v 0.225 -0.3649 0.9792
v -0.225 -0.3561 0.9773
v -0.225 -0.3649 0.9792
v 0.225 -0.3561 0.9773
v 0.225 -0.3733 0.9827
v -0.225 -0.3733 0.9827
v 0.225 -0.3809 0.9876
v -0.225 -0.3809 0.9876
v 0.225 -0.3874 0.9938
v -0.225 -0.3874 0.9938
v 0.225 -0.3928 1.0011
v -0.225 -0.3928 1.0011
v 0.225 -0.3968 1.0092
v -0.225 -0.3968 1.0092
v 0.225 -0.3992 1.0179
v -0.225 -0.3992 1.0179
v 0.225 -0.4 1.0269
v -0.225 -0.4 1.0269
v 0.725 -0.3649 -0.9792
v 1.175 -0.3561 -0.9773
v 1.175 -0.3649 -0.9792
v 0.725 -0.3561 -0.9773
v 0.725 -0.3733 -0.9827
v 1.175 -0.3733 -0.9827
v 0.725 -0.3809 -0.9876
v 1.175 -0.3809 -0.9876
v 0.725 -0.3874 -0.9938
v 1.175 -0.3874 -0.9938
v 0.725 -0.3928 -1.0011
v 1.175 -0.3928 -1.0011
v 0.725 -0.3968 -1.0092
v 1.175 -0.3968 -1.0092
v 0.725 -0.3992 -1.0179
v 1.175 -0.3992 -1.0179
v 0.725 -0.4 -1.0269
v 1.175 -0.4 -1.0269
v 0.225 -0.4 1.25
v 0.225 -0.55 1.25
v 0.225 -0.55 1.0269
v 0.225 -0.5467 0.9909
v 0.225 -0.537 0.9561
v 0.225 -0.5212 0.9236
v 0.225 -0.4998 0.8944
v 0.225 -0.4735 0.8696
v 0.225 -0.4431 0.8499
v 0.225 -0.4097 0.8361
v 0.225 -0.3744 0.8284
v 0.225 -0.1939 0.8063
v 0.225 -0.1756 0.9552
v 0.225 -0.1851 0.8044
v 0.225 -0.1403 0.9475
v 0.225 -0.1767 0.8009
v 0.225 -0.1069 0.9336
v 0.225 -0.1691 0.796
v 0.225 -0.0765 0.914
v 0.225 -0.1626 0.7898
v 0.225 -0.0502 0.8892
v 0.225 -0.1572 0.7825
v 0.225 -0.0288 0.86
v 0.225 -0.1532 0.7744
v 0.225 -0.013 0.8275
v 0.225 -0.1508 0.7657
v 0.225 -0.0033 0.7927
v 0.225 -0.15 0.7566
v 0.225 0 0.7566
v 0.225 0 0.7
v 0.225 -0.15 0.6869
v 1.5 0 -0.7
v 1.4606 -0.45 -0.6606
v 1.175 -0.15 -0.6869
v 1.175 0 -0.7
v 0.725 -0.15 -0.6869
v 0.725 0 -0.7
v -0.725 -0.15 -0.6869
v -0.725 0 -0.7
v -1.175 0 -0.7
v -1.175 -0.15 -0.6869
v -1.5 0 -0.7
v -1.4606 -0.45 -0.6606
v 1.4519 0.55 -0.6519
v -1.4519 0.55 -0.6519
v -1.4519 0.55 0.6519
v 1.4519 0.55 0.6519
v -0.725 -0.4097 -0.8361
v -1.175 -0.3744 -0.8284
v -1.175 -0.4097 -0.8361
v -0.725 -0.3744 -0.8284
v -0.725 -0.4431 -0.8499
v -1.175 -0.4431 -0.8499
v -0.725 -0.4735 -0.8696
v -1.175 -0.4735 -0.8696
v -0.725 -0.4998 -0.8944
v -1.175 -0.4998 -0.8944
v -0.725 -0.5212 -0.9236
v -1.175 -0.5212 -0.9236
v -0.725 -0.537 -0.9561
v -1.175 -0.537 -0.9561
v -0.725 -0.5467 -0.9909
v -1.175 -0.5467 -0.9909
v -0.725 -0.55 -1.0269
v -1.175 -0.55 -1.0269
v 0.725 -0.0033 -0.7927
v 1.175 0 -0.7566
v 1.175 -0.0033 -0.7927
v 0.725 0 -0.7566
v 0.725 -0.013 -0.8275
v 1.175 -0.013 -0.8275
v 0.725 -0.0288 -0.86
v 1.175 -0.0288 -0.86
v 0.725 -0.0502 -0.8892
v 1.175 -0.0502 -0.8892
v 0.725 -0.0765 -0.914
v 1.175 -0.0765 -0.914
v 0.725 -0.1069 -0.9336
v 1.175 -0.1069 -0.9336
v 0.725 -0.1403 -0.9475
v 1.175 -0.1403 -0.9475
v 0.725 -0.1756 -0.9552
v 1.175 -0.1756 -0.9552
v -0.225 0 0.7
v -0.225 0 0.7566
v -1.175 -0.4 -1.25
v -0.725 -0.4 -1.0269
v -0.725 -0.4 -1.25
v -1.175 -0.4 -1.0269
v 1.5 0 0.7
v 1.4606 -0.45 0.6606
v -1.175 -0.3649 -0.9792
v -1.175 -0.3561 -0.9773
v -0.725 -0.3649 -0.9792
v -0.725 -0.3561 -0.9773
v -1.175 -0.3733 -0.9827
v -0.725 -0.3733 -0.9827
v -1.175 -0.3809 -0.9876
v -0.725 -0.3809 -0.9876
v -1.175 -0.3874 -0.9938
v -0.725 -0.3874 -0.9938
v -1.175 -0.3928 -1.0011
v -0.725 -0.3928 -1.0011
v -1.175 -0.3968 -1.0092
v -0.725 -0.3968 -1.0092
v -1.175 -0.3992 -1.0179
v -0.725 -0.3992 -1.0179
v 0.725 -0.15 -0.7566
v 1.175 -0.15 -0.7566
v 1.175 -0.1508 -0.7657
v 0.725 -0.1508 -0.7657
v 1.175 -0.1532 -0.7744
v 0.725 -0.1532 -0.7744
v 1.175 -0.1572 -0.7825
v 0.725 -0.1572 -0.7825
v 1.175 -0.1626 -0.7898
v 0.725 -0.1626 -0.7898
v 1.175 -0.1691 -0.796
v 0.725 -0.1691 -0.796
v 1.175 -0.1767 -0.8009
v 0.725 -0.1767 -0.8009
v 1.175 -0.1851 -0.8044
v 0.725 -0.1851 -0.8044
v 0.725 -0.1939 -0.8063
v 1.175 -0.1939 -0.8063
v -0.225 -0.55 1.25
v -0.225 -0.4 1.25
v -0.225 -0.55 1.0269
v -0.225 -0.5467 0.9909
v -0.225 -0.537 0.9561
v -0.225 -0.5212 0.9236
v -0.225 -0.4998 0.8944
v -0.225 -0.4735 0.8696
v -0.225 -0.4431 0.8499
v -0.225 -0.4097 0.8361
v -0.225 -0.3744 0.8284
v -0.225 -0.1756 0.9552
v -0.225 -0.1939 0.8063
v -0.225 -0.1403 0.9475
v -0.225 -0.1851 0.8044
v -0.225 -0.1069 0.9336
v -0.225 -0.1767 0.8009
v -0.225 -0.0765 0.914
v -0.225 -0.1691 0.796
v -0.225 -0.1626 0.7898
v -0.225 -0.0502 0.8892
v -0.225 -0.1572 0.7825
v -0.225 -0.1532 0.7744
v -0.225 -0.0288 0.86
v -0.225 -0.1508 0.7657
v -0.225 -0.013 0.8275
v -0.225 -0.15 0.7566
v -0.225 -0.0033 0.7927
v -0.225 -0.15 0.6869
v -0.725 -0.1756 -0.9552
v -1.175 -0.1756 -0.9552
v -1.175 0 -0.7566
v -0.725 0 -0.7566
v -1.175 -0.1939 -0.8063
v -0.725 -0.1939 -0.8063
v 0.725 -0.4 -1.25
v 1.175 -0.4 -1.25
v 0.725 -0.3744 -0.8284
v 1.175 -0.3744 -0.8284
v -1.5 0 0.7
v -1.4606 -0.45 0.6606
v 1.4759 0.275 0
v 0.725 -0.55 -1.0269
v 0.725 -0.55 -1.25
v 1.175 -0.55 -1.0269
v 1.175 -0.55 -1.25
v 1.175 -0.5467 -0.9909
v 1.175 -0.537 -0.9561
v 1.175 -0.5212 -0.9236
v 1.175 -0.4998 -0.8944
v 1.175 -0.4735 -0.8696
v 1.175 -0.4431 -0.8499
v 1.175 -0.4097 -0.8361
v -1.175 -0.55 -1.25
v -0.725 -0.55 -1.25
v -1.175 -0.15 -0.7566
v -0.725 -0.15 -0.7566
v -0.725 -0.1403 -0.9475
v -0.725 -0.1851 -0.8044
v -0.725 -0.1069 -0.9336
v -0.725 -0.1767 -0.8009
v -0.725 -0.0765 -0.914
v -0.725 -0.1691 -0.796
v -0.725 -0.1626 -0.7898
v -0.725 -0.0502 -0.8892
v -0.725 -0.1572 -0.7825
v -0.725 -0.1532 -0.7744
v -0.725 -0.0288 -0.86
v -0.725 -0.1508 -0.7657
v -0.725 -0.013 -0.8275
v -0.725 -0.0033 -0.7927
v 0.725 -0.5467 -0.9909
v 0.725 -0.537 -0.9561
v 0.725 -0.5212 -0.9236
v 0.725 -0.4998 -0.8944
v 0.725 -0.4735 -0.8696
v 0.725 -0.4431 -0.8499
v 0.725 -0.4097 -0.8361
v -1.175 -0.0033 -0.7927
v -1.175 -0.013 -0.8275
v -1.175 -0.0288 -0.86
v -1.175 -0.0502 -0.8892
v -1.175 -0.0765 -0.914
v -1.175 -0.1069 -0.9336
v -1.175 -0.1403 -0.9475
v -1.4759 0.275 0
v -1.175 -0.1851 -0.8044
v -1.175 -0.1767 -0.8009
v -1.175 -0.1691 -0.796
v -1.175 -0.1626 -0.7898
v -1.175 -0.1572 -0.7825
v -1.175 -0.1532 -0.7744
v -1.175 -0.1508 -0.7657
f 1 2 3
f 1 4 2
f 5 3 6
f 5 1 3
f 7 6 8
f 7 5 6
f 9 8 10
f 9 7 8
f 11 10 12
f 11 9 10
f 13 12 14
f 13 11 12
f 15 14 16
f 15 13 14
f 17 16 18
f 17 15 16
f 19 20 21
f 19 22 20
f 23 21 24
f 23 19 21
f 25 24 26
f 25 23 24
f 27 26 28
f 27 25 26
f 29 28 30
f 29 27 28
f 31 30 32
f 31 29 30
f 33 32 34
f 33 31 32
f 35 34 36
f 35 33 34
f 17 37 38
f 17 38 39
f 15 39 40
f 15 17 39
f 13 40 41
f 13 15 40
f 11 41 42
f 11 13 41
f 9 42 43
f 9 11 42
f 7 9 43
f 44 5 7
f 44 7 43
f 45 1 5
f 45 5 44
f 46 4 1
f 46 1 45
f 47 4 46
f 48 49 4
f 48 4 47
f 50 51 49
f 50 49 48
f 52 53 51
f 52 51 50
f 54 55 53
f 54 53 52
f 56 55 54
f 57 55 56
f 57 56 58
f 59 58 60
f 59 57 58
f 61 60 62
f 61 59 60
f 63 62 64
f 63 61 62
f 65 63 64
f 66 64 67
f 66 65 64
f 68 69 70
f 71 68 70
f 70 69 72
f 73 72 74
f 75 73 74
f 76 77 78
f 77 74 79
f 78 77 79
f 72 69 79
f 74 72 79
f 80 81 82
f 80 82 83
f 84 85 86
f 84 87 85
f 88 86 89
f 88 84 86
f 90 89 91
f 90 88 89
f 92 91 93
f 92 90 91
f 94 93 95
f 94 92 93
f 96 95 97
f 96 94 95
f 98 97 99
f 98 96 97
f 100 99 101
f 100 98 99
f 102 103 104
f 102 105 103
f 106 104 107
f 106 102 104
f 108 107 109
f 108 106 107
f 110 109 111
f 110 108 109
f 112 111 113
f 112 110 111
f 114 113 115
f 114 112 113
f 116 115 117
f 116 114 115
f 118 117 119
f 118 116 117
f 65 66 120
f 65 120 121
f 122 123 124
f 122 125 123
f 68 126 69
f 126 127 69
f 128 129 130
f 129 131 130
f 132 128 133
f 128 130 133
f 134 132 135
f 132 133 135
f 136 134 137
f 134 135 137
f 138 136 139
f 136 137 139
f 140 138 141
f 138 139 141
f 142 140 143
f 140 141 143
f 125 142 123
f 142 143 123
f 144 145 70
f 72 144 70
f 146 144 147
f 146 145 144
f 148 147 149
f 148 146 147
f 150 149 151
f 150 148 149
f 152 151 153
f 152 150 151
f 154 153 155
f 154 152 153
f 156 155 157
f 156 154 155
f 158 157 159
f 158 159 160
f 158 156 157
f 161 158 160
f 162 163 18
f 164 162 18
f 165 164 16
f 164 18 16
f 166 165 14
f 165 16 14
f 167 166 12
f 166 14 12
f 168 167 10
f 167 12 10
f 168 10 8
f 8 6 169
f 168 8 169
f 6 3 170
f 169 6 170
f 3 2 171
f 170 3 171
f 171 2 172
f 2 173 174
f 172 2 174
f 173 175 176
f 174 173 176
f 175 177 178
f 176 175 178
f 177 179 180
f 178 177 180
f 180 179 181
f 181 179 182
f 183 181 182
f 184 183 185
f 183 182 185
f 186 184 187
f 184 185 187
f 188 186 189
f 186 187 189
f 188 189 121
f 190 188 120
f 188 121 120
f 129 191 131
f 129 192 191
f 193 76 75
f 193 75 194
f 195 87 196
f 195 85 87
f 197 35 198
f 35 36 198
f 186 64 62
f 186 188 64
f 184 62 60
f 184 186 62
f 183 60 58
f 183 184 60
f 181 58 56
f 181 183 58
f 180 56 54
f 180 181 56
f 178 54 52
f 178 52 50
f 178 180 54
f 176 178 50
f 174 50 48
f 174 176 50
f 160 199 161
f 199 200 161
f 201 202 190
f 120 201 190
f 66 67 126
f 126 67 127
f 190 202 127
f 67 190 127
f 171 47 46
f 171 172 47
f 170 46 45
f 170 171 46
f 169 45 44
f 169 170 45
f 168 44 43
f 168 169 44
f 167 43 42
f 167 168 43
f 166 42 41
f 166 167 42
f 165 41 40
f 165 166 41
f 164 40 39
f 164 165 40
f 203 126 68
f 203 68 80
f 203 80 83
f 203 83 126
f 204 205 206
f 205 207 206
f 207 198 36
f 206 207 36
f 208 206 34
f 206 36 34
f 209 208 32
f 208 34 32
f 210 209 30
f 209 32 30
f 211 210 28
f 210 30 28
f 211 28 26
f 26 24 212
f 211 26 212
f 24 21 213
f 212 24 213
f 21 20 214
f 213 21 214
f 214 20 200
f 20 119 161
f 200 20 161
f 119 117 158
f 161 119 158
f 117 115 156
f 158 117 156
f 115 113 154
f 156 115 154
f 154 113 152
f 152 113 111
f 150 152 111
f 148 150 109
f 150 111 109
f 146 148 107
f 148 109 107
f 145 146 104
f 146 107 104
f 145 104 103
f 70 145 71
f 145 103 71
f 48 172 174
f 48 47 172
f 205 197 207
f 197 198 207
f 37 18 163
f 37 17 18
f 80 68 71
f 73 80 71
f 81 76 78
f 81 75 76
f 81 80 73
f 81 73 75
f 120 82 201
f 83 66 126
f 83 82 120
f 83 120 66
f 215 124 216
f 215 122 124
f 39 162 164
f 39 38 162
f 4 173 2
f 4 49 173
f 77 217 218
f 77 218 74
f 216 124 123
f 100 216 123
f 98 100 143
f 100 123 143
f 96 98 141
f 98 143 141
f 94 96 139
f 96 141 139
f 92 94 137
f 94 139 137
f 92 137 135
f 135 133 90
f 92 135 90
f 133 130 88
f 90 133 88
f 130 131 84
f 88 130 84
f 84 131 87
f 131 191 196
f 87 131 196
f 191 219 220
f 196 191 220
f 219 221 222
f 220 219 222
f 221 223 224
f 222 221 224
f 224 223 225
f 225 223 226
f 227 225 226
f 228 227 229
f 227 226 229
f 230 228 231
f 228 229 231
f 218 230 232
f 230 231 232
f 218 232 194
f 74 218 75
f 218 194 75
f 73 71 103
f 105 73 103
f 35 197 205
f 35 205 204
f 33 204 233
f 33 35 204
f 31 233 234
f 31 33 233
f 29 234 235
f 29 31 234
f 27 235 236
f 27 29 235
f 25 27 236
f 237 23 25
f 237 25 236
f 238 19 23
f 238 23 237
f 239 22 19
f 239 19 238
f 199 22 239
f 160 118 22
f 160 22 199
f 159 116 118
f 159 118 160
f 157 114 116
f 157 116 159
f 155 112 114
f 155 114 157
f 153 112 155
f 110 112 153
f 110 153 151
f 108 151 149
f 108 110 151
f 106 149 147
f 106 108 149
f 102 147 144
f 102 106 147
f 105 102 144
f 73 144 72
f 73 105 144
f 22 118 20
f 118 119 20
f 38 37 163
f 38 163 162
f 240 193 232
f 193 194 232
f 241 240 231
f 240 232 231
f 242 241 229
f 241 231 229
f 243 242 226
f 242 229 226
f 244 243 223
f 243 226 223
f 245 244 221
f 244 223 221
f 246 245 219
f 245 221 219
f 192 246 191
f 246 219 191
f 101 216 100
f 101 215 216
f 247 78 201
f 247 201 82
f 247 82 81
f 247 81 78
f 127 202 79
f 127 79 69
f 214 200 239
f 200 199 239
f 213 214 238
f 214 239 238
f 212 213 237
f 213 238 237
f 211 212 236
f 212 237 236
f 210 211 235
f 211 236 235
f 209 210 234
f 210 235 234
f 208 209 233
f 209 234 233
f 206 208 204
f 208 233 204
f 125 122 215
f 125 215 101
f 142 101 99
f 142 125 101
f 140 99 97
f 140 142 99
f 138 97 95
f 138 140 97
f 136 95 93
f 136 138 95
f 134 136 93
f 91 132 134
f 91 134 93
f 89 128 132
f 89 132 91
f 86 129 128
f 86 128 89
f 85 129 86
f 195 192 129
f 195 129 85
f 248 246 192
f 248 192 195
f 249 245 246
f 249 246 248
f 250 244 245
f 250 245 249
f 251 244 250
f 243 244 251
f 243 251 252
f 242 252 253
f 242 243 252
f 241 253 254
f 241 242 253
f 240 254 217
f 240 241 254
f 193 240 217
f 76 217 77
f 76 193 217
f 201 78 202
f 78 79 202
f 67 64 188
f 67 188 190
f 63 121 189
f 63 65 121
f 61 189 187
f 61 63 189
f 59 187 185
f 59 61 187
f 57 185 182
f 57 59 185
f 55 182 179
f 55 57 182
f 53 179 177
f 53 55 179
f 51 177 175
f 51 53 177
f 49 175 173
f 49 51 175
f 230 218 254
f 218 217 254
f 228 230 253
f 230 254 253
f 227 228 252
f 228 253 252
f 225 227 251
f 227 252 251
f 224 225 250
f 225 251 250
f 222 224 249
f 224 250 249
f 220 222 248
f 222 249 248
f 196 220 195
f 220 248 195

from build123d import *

# Parameters (mm, degrees)
SKETCH1_W                = 3
SKETCH1_H                = 1.4
EXTRUDE1_DEPTH           = 0.55
EXTRUDE1_TAPER           = 5
EXTRUDE1_OTHER_WAY_DEPTH = 0.45
EXTRUDE1_OTHER_WAY_TAPER = 5
EXTRUDE2_DEPTH           = 0.225
EXTRUDE2_DEPTH_BACK      = 0.225
EXTRUDE3_START           = 0.95
EXTRUDE3_DEPTH           = 0.225
FILLET1_R                = 0.05
FILLET2_R                = 0.2


with BuildPart() as part:
    # Sketch1 → Extrude1 (new body)
    with BuildSketch(Plane(origin=(0, 0, 0), x_dir=(1, 0, 0), z_dir=(0, 1, 0))):
        Rectangle(SKETCH1_W, SKETCH1_H)
    extrude(amount=EXTRUDE1_DEPTH, taper=EXTRUDE1_TAPER)

    # Sketch1 → Extrude1 other way (add)
    with BuildSketch(Plane(origin=(0, 0, 0), x_dir=(1, 0, 0), z_dir=(0, 1, 0))):
        Rectangle(SKETCH1_W, SKETCH1_H)
    extrude(amount=-EXTRUDE1_OTHER_WAY_DEPTH, taper=EXTRUDE1_OTHER_WAY_TAPER)

    # Sketch2 → Extrude2 (add, two sides)
    with BuildSketch(Plane(origin=(0, 0, 0), x_dir=(0, 0, -1), z_dir=(1, 0, 0))) as extrude2_sk:
        Polygon((-0.585273808, 0), (-0.933594965, 0), (-0.98270879, -0.4), (-1.25, -0.4), (-1.25, -0.55), (-0.85, -0.55), (-0.800886176, -0.15), (-0.585273808, -0.15), align=None)
    extrude(amount=EXTRUDE2_DEPTH)
    extrude(extrude2_sk.sketch, amount=-EXTRUDE2_DEPTH_BACK)

    # Sketch2_3 → Extrude3 (add, symmetric)
    with BuildSketch(Plane(origin=(0, 0, 0), x_dir=(0, 0, -1), z_dir=(1, 0, 0)).offset(EXTRUDE3_START)):
        Polygon((0.585273808, 0), (0.933594965, 0), (0.98270879, -0.4), (1.25, -0.4), (1.25, -0.55), (0.85, -0.55), (0.800886176, -0.15), (0.585273808, -0.15), align=None)
    extrude3 = extrude(amount=EXTRUDE3_DEPTH, both=True)

    # Mirror1: Extrude3 across plane
    add(extrude3.mirror(Plane(origin=(0, 0, 0), x_dir=(0, 0, 1), z_dir=(1, 0, 0))))

    # Fillet1
    fillet1_edges = [part.edges().sort_by_distance(p)[0] for p in [
        (0, -0.4, 0.98270879),
        (0, -0.15, 0.800886176),
        (0.95, -0.15, -0.800886176),
        (0.95, -0.4, -0.98270879),
        (-0.95, -0.4, -0.98270879),
        (-0.95, -0.15, -0.800886176),
    ]]
    fillet(fillet1_edges, radius=FILLET1_R)

    # Fillet2
    fillet2_edges = [part.edges().sort_by_distance(p)[0] for p in [
        (0, 0, 0.933594965),
        (0, -0.55, 0.85),
        (0.95, 0, -0.933594965),
        (0.95, -0.55, -0.85),
        (-0.95, 0, -0.933594965),
        (-0.95, -0.55, -0.85),
    ]]
    fillet(fillet2_edges, radius=FILLET2_R)


solid = part.part
